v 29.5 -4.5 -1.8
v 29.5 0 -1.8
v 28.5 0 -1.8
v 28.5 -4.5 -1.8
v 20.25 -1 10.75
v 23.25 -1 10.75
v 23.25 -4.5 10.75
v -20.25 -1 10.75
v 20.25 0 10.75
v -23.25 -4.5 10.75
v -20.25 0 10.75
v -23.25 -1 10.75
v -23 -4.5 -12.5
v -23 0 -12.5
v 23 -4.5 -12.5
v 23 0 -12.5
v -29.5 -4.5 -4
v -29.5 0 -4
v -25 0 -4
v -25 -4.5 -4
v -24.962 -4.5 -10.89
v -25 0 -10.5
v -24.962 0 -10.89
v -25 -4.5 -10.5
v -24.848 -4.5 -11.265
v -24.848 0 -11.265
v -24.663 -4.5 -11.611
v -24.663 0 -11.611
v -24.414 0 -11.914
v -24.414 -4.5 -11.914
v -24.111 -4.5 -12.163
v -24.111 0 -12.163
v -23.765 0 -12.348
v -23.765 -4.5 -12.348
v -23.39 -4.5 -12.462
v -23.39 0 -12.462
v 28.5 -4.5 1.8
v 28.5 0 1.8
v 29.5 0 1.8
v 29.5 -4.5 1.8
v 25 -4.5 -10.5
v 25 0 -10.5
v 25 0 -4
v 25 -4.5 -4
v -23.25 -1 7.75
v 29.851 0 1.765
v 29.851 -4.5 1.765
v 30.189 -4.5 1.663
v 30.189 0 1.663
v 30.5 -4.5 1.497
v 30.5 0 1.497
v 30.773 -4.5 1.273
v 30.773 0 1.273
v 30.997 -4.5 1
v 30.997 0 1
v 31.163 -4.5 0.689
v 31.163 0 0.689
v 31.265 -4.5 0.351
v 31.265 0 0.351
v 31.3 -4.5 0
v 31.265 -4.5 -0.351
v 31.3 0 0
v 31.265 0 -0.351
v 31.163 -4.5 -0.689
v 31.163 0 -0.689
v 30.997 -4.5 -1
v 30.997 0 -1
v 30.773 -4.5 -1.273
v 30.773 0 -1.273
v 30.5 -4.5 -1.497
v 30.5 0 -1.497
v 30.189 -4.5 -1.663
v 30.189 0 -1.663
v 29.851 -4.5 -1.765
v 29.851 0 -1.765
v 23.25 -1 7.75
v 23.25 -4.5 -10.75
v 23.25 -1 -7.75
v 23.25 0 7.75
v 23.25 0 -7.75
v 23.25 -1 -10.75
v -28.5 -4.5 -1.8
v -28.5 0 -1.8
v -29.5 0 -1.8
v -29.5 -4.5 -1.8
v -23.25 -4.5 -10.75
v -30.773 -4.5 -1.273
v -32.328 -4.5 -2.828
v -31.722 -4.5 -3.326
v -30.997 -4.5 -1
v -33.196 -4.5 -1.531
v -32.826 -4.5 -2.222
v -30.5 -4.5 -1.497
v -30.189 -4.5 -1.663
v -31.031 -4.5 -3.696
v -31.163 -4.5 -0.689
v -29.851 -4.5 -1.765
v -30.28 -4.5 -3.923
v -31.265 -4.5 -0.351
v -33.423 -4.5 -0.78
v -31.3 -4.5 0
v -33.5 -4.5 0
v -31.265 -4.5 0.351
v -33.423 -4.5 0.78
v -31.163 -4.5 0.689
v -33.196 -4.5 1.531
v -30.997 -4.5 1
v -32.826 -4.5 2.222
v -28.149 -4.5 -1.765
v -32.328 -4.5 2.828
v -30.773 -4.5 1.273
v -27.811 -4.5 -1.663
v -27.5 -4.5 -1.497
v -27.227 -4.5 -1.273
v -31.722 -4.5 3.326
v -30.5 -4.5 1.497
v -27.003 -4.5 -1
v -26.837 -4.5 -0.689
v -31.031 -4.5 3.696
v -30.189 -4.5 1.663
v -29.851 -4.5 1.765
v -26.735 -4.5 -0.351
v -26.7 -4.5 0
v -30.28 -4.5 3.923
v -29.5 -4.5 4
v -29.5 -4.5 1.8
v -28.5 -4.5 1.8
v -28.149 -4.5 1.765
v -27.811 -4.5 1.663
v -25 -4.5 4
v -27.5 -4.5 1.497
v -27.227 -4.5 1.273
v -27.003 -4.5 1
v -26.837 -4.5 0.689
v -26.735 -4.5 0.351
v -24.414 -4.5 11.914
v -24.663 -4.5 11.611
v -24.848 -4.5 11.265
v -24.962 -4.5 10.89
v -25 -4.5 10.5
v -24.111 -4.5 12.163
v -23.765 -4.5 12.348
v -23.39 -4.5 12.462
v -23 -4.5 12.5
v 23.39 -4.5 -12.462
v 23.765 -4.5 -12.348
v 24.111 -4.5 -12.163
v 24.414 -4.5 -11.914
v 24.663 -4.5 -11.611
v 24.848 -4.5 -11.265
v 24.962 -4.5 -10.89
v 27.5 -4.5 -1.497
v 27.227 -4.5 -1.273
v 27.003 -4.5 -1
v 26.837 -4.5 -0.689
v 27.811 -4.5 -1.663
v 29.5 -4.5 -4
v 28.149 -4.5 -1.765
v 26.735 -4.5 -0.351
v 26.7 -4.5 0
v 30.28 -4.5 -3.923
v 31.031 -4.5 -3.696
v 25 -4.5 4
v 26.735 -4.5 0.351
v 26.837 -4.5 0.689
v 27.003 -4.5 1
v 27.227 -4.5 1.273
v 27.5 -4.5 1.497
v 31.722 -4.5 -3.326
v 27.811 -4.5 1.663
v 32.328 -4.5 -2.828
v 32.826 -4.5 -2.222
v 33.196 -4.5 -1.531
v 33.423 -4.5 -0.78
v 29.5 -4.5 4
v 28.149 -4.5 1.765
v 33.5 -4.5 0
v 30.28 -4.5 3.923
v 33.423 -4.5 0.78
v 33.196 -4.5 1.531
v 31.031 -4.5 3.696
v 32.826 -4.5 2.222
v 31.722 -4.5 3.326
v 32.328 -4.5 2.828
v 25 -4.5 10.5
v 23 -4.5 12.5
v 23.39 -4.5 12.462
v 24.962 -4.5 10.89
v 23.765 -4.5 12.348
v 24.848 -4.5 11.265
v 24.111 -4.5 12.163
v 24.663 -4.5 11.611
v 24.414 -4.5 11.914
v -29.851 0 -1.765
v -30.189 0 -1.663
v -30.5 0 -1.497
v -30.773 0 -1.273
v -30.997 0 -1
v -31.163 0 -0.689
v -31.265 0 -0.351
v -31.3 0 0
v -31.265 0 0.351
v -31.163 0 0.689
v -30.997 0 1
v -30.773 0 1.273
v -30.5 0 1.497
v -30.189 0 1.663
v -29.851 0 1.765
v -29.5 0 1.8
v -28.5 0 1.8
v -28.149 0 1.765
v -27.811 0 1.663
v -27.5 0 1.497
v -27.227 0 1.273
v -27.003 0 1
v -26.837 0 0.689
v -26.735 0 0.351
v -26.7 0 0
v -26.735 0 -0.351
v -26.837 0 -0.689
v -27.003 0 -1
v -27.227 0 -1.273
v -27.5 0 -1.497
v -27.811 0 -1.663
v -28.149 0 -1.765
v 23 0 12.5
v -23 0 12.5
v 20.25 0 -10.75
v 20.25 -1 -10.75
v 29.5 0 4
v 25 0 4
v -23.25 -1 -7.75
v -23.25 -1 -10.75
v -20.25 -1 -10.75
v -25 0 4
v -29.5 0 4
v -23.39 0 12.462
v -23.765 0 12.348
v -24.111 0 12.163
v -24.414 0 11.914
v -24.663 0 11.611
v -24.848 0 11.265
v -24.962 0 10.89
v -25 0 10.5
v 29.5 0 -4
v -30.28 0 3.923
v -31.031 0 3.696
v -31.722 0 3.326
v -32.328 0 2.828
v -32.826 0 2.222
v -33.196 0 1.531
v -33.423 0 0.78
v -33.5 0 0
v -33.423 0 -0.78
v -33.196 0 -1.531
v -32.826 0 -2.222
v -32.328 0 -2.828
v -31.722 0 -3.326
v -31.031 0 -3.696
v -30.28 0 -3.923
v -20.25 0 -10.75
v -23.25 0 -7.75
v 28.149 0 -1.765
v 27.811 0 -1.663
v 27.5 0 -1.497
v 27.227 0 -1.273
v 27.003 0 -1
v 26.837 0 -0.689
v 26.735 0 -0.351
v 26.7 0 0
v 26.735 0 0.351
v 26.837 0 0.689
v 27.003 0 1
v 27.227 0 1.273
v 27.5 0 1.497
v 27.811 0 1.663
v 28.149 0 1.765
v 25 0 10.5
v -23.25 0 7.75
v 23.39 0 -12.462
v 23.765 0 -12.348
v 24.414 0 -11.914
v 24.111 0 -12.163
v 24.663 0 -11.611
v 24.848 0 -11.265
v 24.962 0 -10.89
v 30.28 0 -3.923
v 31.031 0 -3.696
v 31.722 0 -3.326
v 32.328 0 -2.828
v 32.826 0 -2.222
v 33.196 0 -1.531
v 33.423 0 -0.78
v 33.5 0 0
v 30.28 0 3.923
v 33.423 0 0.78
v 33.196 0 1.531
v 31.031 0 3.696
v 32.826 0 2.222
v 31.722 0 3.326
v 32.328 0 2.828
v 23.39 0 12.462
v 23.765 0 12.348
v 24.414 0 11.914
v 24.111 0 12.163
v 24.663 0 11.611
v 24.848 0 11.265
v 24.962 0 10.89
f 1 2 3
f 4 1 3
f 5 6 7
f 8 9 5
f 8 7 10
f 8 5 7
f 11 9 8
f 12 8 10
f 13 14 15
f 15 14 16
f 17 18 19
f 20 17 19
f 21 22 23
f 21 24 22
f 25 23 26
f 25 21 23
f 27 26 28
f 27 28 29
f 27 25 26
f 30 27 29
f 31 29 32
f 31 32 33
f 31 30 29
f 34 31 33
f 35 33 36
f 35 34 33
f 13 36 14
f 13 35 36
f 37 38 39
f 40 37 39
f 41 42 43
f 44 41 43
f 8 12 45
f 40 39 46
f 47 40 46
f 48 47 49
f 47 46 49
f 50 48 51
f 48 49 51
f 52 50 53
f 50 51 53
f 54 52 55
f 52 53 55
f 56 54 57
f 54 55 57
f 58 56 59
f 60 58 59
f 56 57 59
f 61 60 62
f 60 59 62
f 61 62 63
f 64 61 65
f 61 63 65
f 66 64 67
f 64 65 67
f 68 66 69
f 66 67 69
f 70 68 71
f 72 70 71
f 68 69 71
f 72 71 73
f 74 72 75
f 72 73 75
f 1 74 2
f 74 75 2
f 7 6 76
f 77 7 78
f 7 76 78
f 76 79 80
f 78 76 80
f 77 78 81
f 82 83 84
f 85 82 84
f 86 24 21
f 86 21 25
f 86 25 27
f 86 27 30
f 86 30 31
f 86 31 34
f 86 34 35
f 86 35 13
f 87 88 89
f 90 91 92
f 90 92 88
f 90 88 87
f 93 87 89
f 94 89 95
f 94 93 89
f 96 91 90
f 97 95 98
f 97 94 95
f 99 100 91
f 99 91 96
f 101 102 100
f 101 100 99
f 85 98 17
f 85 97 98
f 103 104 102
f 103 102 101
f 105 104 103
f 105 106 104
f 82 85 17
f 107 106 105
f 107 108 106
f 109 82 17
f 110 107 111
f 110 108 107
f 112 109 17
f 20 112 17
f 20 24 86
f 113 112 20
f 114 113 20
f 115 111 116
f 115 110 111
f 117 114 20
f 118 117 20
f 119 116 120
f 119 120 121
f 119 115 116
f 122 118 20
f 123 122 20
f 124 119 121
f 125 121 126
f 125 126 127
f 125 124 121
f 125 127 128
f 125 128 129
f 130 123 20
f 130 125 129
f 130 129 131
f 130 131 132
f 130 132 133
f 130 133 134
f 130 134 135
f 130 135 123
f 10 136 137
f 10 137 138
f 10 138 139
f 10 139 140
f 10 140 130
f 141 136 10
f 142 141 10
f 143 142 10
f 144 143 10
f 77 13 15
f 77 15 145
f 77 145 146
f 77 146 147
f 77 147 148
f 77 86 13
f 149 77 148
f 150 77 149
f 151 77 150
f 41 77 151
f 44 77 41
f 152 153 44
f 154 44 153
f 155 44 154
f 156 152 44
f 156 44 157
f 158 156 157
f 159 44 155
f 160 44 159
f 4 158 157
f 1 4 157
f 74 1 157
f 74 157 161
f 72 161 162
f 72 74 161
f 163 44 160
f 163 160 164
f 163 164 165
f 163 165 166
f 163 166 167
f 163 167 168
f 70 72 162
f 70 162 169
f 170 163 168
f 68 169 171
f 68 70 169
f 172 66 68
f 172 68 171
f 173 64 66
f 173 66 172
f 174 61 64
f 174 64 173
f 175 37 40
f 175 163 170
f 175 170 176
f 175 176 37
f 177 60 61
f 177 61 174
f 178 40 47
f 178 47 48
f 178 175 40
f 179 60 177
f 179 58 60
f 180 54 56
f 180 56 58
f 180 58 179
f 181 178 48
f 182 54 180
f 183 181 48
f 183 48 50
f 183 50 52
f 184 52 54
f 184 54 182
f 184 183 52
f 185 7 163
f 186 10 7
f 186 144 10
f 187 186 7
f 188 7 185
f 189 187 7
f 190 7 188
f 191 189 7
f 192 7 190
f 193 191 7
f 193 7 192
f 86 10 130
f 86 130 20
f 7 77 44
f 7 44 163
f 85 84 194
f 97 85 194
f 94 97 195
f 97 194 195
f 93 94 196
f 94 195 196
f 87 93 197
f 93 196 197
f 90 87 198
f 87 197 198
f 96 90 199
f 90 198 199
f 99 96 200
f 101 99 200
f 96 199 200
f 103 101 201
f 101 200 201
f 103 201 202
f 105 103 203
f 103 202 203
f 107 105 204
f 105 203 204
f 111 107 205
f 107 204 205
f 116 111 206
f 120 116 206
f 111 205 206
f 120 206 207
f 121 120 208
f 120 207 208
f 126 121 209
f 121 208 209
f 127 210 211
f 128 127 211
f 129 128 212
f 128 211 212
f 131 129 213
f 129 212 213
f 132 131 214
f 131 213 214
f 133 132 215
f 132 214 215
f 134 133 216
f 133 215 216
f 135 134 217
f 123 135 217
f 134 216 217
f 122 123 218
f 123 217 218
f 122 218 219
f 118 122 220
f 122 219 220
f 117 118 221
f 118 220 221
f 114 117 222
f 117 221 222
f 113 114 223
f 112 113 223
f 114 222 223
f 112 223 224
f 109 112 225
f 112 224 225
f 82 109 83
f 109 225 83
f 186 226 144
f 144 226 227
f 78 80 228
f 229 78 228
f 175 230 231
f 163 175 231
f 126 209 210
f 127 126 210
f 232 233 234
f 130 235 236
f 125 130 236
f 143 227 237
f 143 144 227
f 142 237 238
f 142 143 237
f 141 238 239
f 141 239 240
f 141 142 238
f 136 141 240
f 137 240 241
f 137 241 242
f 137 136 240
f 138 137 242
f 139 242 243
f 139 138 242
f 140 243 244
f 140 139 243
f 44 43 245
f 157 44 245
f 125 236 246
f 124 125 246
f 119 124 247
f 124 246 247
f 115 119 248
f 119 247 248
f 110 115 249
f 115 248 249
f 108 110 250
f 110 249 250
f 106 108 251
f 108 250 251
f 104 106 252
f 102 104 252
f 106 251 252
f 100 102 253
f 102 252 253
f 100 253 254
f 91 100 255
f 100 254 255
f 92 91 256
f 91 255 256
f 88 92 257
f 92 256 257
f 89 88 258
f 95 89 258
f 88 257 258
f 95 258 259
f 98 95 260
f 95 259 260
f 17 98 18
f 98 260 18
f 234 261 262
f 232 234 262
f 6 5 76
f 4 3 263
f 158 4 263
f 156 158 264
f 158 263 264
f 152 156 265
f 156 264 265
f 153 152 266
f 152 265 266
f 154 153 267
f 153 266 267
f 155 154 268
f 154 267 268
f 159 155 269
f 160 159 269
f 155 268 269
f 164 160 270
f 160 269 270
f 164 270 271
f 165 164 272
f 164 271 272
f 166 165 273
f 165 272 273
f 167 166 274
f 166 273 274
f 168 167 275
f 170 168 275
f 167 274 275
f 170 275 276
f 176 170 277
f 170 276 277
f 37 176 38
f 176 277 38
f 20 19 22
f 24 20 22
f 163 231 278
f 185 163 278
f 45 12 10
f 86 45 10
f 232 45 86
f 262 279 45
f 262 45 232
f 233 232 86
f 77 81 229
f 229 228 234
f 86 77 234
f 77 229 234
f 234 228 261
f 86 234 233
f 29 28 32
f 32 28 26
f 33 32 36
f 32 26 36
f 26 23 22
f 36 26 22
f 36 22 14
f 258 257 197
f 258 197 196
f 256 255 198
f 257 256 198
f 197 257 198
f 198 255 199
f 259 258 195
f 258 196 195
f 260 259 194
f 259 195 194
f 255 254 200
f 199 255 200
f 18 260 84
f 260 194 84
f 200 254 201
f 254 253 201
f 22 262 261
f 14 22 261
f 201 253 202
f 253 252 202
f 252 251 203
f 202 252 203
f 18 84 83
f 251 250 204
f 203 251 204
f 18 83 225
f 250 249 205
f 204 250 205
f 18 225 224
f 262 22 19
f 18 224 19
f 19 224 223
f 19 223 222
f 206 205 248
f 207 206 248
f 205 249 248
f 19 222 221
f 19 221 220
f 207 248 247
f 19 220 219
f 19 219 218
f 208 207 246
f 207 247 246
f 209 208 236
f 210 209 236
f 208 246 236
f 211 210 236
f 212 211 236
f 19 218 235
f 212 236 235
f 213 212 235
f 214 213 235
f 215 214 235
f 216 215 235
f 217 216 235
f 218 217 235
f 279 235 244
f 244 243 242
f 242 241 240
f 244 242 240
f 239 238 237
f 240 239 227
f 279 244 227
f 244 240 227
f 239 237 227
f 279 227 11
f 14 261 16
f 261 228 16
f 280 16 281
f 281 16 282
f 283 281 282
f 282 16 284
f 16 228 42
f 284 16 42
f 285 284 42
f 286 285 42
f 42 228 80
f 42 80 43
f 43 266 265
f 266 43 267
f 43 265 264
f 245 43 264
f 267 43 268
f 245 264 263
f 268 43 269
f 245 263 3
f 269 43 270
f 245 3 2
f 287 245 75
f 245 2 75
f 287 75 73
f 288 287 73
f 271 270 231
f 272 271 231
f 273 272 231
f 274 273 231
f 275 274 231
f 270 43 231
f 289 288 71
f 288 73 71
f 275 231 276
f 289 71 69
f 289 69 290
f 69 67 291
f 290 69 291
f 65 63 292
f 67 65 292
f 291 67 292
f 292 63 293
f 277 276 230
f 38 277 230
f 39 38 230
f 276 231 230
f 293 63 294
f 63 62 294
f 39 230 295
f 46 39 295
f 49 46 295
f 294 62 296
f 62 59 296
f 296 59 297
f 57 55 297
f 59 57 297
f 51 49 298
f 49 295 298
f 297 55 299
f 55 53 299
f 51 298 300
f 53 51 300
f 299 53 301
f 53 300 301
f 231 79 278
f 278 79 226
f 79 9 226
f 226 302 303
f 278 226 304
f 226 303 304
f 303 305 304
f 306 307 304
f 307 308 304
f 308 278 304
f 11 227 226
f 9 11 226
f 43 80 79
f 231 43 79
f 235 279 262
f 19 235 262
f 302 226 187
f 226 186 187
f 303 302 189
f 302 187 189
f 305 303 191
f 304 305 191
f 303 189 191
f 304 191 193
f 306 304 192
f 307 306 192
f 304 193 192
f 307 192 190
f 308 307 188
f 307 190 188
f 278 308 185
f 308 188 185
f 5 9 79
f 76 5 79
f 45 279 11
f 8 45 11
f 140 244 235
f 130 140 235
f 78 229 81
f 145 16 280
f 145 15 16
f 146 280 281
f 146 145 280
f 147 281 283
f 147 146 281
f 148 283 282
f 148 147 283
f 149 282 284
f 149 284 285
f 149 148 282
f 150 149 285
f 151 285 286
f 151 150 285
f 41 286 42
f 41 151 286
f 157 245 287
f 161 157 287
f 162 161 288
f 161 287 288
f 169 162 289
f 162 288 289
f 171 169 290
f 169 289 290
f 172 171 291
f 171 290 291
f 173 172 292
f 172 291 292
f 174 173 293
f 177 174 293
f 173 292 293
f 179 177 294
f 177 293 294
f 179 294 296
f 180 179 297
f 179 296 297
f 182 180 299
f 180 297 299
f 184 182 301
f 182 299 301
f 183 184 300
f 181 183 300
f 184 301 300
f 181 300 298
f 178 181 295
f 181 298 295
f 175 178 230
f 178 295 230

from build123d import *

# Parameters (mm, degrees)
F1_DEPTH = 4.5
F2_DEPTH = 4.501
F3_DEPTH = 1
F4_R     = 2


# Not quite as in the source:
# - a feature names something its author has since deleted; it is built from what else it names


with BuildPart() as f1:
    # F0 (on Front) → F1 (new body)
    with BuildSketch(Plane.XZ):
        Polygon((25, 12.5), (-25, 12.5), (-25, 4), (-25, -4), (-25, -12.5), (25, -12.5), (25, -4), (25, 4), align=None)
        Polygon((-23.25, 7.75), (-23.25, 10.75), (-20.25, 10.75), (20.25, 10.75), (23.25, 10.75), (23.25, 7.75), (23.25, -7.75), (23.25, -10.75), (20.25, -10.75), (-20.25, -10.75), (-23.25, -10.75), (-23.25, -7.75), align=None, mode=Mode.SUBTRACT)
        Polygon((-20.25, 10.75), (-23.25, 10.75), (-23.25, 7.75), align=None)
        Polygon((23.25, 10.75), (20.25, 10.75), (23.25, 7.75), align=None)
        with BuildLine():
            Line((-25, -4), (-25, 4))
            Line((-25, 4), (-29.5, 4))
            ThreePointArc((-29.5, 4), (-33.5, 0), (-29.5, -4))
            Line((-29.5, -4), (-25, -4))
        make_face()
        with BuildLine():
            Line((-28.5, -1.8), (-29.5, -1.8))
            ThreePointArc((-29.5, -1.8), (-31.3, 0), (-29.5, 1.8))
            Line((-29.5, 1.8), (-28.5, 1.8))
            ThreePointArc((-28.5, 1.8), (-26.7, 0), (-28.5, -1.8))
        make_face(mode=Mode.SUBTRACT)
        with BuildLine():
            Line((29.5, 4), (25, 4))
            Line((25, 4), (25, -4))
            Line((25, -4), (29.5, -4))
            ThreePointArc((29.5, -4), (33.5, 0), (29.5, 4))
        make_face()
        with BuildLine():
            ThreePointArc((29.5, 1.8), (31.3, 0), (29.5, -1.8))
            Line((29.5, -1.8), (28.5, -1.8))
            ThreePointArc((28.5, -1.8), (26.7, 0), (28.5, 1.8))
            Line((28.5, 1.8), (29.5, 1.8))
        make_face(mode=Mode.SUBTRACT)
    extrude(amount=F1_DEPTH)

    # F0 (on Front) → F2 (cut, through all)
    with BuildSketch(Plane.XZ):
        Polygon((-20.25, 10.75), (-23.25, 10.75), (-23.25, 7.75), align=None)
        Polygon((20.25, 10.75), (-20.25, 10.75), (-23.25, 7.75), (-23.25, -7.75), (-20.25, -10.75), (20.25, -10.75), (23.25, -7.75), (23.25, 7.75), align=None)
        Polygon((23.25, 10.75), (20.25, 10.75), (23.25, 7.75), align=None)
    extrude(amount=F2_DEPTH, mode=Mode.SUBTRACT)

    # F0 (on Front) → F3 (join)
    with BuildSketch(Plane.XZ):
        Polygon((23.25, 10.75), (20.25, 10.75), (23.25, 7.75), align=None)
        Polygon((23.25, -10.75), (23.25, -7.75), (20.25, -10.75), align=None)
        Polygon((-20.25, 10.75), (-23.25, 10.75), (-23.25, 7.75), align=None)
        Polygon((-20.25, -10.75), (-23.25, -7.75), (-23.25, -10.75), align=None)
    extrude(amount=F3_DEPTH)

    # F4
    f4_edges = [f1.edges().sort_by_distance(p)[0] for p in [
        (-25, -2.25, -12.5),
        (25, -2.25, -12.5),
        (25, -2.25, 12.5),
        (-25, -2.25, 12.5),
    ]]
    fillet(f4_edges, radius=F4_R)


solid = f1.part
